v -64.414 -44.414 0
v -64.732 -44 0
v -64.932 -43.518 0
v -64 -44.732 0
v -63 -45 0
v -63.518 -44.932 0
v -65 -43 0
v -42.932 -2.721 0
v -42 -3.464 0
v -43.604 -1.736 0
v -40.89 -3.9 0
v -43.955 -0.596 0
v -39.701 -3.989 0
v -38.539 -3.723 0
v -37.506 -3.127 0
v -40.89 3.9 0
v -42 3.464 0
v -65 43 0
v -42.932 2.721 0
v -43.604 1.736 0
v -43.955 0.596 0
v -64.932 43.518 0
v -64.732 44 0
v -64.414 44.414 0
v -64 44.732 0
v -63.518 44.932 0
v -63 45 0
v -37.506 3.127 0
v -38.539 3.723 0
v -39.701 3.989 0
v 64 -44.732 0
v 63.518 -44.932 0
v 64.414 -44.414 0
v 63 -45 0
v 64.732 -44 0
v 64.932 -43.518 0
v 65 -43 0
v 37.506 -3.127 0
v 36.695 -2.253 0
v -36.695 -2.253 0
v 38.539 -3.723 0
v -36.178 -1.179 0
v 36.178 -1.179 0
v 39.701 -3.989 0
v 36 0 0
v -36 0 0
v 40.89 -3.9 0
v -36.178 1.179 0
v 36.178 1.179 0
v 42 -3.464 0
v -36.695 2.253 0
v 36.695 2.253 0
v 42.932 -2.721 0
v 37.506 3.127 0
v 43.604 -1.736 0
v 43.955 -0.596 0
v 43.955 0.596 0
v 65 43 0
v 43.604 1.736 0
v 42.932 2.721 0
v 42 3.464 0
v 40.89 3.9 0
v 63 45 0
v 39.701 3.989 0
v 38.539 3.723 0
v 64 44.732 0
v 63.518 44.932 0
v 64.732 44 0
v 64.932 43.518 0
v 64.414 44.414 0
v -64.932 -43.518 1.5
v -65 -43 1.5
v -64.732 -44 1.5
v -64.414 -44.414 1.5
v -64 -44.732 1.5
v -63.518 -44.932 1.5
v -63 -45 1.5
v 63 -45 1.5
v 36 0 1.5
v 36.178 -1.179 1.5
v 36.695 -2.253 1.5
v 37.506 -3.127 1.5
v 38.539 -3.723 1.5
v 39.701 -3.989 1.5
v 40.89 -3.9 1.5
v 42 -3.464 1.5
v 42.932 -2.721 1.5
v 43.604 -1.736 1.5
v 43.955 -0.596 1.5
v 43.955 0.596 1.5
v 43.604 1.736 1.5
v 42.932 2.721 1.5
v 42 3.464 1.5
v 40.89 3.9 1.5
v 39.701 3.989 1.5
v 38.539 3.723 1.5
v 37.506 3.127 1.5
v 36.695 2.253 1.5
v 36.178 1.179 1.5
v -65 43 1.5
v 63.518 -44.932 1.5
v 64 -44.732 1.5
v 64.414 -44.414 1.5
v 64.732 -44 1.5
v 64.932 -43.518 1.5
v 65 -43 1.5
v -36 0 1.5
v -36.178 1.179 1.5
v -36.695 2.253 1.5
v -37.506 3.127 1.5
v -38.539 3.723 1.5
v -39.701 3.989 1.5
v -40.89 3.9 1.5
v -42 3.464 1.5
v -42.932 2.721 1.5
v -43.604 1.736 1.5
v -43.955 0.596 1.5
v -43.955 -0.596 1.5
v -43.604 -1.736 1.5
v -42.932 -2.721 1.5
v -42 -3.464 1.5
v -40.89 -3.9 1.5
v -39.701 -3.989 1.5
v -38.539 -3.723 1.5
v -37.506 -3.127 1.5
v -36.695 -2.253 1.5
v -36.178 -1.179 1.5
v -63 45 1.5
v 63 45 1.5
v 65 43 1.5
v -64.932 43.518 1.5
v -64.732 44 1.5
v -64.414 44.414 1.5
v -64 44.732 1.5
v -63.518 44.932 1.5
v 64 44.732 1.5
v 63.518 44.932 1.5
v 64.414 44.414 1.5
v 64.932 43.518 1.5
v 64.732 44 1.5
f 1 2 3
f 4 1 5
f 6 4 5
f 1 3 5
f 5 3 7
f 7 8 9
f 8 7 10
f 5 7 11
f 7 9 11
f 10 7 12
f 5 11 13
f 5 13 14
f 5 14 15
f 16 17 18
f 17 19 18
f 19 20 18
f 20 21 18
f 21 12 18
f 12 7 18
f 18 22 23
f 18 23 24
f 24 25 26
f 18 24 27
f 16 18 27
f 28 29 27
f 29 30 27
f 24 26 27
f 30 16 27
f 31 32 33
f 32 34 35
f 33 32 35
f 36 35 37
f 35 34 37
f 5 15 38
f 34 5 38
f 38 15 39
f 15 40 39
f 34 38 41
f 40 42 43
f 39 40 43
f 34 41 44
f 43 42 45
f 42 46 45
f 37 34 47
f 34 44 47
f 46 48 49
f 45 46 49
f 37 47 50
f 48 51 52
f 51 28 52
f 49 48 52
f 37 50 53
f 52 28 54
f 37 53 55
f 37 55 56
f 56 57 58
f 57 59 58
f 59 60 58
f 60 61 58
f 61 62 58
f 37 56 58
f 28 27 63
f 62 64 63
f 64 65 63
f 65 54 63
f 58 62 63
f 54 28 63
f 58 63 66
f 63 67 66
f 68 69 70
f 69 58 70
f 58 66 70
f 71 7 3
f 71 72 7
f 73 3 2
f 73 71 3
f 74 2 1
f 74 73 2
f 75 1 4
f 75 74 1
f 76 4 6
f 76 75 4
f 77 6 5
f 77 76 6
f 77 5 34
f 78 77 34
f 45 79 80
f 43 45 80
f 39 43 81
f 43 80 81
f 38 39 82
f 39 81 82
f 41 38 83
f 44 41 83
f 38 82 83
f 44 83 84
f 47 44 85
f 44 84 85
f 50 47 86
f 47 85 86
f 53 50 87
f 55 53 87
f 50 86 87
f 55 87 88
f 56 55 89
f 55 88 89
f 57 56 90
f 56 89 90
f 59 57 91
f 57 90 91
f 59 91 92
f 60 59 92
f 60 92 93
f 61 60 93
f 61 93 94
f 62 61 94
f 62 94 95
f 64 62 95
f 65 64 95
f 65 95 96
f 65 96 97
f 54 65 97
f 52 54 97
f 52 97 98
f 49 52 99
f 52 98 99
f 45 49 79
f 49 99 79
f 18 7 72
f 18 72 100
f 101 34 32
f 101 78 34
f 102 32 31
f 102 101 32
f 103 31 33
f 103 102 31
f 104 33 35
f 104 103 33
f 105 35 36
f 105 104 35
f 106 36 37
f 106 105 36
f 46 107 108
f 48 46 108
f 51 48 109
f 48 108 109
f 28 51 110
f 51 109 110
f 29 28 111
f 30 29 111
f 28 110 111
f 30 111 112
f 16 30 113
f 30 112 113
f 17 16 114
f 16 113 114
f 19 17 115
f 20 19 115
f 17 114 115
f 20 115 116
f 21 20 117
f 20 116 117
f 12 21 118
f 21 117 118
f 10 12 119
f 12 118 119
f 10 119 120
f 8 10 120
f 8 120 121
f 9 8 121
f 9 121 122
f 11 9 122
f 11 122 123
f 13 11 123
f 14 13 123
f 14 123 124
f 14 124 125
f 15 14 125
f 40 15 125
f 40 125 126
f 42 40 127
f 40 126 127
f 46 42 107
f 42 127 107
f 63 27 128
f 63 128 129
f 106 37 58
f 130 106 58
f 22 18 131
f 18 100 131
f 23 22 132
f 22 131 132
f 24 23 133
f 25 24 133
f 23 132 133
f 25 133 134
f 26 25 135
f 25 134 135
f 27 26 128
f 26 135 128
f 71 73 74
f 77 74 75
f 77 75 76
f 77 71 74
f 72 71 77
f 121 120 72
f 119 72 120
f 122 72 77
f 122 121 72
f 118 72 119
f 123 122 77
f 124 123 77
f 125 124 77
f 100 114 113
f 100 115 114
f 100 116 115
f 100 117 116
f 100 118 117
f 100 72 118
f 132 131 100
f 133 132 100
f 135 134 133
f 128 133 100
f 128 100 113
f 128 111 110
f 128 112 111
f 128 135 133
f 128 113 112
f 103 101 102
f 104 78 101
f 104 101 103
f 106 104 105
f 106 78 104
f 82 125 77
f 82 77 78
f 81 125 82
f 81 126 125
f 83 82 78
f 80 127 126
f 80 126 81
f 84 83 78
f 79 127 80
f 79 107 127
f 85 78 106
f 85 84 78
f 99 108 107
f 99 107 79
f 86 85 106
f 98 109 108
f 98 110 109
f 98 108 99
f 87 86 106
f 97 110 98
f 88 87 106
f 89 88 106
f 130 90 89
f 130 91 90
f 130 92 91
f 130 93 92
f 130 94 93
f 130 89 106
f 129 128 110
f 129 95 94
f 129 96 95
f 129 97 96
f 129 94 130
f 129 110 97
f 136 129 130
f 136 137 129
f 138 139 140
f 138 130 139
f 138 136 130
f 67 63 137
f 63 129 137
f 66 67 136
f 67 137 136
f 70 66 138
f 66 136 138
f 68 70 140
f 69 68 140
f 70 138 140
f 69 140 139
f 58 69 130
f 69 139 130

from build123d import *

# Parameters (mm, degrees)
SKETCH_1_W          = 130
SKETCH_1_H          = 90
EXTRUDE_1_DEPTH     = 1.5
SKETCH_2_R          = 4
CUT_EXTRUDE_1_DEPTH = 1.5
FILLET_1_R          = 2


with BuildPart() as part:
    # ｽｹｯﾁ1 → ﾎﾞｽ - 押し出し1 (new body)
    with BuildSketch(Plane.XY):
        Rectangle(SKETCH_1_W, SKETCH_1_H)
    extrude(amount=EXTRUDE_1_DEPTH)

    # ｽｹｯﾁ2 → ｶｯﾄ - 押し出し1 (cut)
    with BuildSketch(Plane.XY.offset(1.5)):
        with Locations((-40, 0)):
            Circle(SKETCH_2_R)
        with Locations(Location((40, 0, 0), (0, 0, 180))):
            Circle(SKETCH_2_R)
    extrude(amount=-CUT_EXTRUDE_1_DEPTH, mode=Mode.SUBTRACT)

    # ﾌｨﾚｯﾄ1
    fillet_1_edges = [part.edges().sort_by_distance(p)[0] for p in [
        (65, -45, 0.75),
        (-65, -45, 0.75),
        (-65, 45, 0.75),
        (65, 45, 0.75),
    ]]
    fillet(fillet_1_edges, radius=FILLET_1_R)


solid = part.part
